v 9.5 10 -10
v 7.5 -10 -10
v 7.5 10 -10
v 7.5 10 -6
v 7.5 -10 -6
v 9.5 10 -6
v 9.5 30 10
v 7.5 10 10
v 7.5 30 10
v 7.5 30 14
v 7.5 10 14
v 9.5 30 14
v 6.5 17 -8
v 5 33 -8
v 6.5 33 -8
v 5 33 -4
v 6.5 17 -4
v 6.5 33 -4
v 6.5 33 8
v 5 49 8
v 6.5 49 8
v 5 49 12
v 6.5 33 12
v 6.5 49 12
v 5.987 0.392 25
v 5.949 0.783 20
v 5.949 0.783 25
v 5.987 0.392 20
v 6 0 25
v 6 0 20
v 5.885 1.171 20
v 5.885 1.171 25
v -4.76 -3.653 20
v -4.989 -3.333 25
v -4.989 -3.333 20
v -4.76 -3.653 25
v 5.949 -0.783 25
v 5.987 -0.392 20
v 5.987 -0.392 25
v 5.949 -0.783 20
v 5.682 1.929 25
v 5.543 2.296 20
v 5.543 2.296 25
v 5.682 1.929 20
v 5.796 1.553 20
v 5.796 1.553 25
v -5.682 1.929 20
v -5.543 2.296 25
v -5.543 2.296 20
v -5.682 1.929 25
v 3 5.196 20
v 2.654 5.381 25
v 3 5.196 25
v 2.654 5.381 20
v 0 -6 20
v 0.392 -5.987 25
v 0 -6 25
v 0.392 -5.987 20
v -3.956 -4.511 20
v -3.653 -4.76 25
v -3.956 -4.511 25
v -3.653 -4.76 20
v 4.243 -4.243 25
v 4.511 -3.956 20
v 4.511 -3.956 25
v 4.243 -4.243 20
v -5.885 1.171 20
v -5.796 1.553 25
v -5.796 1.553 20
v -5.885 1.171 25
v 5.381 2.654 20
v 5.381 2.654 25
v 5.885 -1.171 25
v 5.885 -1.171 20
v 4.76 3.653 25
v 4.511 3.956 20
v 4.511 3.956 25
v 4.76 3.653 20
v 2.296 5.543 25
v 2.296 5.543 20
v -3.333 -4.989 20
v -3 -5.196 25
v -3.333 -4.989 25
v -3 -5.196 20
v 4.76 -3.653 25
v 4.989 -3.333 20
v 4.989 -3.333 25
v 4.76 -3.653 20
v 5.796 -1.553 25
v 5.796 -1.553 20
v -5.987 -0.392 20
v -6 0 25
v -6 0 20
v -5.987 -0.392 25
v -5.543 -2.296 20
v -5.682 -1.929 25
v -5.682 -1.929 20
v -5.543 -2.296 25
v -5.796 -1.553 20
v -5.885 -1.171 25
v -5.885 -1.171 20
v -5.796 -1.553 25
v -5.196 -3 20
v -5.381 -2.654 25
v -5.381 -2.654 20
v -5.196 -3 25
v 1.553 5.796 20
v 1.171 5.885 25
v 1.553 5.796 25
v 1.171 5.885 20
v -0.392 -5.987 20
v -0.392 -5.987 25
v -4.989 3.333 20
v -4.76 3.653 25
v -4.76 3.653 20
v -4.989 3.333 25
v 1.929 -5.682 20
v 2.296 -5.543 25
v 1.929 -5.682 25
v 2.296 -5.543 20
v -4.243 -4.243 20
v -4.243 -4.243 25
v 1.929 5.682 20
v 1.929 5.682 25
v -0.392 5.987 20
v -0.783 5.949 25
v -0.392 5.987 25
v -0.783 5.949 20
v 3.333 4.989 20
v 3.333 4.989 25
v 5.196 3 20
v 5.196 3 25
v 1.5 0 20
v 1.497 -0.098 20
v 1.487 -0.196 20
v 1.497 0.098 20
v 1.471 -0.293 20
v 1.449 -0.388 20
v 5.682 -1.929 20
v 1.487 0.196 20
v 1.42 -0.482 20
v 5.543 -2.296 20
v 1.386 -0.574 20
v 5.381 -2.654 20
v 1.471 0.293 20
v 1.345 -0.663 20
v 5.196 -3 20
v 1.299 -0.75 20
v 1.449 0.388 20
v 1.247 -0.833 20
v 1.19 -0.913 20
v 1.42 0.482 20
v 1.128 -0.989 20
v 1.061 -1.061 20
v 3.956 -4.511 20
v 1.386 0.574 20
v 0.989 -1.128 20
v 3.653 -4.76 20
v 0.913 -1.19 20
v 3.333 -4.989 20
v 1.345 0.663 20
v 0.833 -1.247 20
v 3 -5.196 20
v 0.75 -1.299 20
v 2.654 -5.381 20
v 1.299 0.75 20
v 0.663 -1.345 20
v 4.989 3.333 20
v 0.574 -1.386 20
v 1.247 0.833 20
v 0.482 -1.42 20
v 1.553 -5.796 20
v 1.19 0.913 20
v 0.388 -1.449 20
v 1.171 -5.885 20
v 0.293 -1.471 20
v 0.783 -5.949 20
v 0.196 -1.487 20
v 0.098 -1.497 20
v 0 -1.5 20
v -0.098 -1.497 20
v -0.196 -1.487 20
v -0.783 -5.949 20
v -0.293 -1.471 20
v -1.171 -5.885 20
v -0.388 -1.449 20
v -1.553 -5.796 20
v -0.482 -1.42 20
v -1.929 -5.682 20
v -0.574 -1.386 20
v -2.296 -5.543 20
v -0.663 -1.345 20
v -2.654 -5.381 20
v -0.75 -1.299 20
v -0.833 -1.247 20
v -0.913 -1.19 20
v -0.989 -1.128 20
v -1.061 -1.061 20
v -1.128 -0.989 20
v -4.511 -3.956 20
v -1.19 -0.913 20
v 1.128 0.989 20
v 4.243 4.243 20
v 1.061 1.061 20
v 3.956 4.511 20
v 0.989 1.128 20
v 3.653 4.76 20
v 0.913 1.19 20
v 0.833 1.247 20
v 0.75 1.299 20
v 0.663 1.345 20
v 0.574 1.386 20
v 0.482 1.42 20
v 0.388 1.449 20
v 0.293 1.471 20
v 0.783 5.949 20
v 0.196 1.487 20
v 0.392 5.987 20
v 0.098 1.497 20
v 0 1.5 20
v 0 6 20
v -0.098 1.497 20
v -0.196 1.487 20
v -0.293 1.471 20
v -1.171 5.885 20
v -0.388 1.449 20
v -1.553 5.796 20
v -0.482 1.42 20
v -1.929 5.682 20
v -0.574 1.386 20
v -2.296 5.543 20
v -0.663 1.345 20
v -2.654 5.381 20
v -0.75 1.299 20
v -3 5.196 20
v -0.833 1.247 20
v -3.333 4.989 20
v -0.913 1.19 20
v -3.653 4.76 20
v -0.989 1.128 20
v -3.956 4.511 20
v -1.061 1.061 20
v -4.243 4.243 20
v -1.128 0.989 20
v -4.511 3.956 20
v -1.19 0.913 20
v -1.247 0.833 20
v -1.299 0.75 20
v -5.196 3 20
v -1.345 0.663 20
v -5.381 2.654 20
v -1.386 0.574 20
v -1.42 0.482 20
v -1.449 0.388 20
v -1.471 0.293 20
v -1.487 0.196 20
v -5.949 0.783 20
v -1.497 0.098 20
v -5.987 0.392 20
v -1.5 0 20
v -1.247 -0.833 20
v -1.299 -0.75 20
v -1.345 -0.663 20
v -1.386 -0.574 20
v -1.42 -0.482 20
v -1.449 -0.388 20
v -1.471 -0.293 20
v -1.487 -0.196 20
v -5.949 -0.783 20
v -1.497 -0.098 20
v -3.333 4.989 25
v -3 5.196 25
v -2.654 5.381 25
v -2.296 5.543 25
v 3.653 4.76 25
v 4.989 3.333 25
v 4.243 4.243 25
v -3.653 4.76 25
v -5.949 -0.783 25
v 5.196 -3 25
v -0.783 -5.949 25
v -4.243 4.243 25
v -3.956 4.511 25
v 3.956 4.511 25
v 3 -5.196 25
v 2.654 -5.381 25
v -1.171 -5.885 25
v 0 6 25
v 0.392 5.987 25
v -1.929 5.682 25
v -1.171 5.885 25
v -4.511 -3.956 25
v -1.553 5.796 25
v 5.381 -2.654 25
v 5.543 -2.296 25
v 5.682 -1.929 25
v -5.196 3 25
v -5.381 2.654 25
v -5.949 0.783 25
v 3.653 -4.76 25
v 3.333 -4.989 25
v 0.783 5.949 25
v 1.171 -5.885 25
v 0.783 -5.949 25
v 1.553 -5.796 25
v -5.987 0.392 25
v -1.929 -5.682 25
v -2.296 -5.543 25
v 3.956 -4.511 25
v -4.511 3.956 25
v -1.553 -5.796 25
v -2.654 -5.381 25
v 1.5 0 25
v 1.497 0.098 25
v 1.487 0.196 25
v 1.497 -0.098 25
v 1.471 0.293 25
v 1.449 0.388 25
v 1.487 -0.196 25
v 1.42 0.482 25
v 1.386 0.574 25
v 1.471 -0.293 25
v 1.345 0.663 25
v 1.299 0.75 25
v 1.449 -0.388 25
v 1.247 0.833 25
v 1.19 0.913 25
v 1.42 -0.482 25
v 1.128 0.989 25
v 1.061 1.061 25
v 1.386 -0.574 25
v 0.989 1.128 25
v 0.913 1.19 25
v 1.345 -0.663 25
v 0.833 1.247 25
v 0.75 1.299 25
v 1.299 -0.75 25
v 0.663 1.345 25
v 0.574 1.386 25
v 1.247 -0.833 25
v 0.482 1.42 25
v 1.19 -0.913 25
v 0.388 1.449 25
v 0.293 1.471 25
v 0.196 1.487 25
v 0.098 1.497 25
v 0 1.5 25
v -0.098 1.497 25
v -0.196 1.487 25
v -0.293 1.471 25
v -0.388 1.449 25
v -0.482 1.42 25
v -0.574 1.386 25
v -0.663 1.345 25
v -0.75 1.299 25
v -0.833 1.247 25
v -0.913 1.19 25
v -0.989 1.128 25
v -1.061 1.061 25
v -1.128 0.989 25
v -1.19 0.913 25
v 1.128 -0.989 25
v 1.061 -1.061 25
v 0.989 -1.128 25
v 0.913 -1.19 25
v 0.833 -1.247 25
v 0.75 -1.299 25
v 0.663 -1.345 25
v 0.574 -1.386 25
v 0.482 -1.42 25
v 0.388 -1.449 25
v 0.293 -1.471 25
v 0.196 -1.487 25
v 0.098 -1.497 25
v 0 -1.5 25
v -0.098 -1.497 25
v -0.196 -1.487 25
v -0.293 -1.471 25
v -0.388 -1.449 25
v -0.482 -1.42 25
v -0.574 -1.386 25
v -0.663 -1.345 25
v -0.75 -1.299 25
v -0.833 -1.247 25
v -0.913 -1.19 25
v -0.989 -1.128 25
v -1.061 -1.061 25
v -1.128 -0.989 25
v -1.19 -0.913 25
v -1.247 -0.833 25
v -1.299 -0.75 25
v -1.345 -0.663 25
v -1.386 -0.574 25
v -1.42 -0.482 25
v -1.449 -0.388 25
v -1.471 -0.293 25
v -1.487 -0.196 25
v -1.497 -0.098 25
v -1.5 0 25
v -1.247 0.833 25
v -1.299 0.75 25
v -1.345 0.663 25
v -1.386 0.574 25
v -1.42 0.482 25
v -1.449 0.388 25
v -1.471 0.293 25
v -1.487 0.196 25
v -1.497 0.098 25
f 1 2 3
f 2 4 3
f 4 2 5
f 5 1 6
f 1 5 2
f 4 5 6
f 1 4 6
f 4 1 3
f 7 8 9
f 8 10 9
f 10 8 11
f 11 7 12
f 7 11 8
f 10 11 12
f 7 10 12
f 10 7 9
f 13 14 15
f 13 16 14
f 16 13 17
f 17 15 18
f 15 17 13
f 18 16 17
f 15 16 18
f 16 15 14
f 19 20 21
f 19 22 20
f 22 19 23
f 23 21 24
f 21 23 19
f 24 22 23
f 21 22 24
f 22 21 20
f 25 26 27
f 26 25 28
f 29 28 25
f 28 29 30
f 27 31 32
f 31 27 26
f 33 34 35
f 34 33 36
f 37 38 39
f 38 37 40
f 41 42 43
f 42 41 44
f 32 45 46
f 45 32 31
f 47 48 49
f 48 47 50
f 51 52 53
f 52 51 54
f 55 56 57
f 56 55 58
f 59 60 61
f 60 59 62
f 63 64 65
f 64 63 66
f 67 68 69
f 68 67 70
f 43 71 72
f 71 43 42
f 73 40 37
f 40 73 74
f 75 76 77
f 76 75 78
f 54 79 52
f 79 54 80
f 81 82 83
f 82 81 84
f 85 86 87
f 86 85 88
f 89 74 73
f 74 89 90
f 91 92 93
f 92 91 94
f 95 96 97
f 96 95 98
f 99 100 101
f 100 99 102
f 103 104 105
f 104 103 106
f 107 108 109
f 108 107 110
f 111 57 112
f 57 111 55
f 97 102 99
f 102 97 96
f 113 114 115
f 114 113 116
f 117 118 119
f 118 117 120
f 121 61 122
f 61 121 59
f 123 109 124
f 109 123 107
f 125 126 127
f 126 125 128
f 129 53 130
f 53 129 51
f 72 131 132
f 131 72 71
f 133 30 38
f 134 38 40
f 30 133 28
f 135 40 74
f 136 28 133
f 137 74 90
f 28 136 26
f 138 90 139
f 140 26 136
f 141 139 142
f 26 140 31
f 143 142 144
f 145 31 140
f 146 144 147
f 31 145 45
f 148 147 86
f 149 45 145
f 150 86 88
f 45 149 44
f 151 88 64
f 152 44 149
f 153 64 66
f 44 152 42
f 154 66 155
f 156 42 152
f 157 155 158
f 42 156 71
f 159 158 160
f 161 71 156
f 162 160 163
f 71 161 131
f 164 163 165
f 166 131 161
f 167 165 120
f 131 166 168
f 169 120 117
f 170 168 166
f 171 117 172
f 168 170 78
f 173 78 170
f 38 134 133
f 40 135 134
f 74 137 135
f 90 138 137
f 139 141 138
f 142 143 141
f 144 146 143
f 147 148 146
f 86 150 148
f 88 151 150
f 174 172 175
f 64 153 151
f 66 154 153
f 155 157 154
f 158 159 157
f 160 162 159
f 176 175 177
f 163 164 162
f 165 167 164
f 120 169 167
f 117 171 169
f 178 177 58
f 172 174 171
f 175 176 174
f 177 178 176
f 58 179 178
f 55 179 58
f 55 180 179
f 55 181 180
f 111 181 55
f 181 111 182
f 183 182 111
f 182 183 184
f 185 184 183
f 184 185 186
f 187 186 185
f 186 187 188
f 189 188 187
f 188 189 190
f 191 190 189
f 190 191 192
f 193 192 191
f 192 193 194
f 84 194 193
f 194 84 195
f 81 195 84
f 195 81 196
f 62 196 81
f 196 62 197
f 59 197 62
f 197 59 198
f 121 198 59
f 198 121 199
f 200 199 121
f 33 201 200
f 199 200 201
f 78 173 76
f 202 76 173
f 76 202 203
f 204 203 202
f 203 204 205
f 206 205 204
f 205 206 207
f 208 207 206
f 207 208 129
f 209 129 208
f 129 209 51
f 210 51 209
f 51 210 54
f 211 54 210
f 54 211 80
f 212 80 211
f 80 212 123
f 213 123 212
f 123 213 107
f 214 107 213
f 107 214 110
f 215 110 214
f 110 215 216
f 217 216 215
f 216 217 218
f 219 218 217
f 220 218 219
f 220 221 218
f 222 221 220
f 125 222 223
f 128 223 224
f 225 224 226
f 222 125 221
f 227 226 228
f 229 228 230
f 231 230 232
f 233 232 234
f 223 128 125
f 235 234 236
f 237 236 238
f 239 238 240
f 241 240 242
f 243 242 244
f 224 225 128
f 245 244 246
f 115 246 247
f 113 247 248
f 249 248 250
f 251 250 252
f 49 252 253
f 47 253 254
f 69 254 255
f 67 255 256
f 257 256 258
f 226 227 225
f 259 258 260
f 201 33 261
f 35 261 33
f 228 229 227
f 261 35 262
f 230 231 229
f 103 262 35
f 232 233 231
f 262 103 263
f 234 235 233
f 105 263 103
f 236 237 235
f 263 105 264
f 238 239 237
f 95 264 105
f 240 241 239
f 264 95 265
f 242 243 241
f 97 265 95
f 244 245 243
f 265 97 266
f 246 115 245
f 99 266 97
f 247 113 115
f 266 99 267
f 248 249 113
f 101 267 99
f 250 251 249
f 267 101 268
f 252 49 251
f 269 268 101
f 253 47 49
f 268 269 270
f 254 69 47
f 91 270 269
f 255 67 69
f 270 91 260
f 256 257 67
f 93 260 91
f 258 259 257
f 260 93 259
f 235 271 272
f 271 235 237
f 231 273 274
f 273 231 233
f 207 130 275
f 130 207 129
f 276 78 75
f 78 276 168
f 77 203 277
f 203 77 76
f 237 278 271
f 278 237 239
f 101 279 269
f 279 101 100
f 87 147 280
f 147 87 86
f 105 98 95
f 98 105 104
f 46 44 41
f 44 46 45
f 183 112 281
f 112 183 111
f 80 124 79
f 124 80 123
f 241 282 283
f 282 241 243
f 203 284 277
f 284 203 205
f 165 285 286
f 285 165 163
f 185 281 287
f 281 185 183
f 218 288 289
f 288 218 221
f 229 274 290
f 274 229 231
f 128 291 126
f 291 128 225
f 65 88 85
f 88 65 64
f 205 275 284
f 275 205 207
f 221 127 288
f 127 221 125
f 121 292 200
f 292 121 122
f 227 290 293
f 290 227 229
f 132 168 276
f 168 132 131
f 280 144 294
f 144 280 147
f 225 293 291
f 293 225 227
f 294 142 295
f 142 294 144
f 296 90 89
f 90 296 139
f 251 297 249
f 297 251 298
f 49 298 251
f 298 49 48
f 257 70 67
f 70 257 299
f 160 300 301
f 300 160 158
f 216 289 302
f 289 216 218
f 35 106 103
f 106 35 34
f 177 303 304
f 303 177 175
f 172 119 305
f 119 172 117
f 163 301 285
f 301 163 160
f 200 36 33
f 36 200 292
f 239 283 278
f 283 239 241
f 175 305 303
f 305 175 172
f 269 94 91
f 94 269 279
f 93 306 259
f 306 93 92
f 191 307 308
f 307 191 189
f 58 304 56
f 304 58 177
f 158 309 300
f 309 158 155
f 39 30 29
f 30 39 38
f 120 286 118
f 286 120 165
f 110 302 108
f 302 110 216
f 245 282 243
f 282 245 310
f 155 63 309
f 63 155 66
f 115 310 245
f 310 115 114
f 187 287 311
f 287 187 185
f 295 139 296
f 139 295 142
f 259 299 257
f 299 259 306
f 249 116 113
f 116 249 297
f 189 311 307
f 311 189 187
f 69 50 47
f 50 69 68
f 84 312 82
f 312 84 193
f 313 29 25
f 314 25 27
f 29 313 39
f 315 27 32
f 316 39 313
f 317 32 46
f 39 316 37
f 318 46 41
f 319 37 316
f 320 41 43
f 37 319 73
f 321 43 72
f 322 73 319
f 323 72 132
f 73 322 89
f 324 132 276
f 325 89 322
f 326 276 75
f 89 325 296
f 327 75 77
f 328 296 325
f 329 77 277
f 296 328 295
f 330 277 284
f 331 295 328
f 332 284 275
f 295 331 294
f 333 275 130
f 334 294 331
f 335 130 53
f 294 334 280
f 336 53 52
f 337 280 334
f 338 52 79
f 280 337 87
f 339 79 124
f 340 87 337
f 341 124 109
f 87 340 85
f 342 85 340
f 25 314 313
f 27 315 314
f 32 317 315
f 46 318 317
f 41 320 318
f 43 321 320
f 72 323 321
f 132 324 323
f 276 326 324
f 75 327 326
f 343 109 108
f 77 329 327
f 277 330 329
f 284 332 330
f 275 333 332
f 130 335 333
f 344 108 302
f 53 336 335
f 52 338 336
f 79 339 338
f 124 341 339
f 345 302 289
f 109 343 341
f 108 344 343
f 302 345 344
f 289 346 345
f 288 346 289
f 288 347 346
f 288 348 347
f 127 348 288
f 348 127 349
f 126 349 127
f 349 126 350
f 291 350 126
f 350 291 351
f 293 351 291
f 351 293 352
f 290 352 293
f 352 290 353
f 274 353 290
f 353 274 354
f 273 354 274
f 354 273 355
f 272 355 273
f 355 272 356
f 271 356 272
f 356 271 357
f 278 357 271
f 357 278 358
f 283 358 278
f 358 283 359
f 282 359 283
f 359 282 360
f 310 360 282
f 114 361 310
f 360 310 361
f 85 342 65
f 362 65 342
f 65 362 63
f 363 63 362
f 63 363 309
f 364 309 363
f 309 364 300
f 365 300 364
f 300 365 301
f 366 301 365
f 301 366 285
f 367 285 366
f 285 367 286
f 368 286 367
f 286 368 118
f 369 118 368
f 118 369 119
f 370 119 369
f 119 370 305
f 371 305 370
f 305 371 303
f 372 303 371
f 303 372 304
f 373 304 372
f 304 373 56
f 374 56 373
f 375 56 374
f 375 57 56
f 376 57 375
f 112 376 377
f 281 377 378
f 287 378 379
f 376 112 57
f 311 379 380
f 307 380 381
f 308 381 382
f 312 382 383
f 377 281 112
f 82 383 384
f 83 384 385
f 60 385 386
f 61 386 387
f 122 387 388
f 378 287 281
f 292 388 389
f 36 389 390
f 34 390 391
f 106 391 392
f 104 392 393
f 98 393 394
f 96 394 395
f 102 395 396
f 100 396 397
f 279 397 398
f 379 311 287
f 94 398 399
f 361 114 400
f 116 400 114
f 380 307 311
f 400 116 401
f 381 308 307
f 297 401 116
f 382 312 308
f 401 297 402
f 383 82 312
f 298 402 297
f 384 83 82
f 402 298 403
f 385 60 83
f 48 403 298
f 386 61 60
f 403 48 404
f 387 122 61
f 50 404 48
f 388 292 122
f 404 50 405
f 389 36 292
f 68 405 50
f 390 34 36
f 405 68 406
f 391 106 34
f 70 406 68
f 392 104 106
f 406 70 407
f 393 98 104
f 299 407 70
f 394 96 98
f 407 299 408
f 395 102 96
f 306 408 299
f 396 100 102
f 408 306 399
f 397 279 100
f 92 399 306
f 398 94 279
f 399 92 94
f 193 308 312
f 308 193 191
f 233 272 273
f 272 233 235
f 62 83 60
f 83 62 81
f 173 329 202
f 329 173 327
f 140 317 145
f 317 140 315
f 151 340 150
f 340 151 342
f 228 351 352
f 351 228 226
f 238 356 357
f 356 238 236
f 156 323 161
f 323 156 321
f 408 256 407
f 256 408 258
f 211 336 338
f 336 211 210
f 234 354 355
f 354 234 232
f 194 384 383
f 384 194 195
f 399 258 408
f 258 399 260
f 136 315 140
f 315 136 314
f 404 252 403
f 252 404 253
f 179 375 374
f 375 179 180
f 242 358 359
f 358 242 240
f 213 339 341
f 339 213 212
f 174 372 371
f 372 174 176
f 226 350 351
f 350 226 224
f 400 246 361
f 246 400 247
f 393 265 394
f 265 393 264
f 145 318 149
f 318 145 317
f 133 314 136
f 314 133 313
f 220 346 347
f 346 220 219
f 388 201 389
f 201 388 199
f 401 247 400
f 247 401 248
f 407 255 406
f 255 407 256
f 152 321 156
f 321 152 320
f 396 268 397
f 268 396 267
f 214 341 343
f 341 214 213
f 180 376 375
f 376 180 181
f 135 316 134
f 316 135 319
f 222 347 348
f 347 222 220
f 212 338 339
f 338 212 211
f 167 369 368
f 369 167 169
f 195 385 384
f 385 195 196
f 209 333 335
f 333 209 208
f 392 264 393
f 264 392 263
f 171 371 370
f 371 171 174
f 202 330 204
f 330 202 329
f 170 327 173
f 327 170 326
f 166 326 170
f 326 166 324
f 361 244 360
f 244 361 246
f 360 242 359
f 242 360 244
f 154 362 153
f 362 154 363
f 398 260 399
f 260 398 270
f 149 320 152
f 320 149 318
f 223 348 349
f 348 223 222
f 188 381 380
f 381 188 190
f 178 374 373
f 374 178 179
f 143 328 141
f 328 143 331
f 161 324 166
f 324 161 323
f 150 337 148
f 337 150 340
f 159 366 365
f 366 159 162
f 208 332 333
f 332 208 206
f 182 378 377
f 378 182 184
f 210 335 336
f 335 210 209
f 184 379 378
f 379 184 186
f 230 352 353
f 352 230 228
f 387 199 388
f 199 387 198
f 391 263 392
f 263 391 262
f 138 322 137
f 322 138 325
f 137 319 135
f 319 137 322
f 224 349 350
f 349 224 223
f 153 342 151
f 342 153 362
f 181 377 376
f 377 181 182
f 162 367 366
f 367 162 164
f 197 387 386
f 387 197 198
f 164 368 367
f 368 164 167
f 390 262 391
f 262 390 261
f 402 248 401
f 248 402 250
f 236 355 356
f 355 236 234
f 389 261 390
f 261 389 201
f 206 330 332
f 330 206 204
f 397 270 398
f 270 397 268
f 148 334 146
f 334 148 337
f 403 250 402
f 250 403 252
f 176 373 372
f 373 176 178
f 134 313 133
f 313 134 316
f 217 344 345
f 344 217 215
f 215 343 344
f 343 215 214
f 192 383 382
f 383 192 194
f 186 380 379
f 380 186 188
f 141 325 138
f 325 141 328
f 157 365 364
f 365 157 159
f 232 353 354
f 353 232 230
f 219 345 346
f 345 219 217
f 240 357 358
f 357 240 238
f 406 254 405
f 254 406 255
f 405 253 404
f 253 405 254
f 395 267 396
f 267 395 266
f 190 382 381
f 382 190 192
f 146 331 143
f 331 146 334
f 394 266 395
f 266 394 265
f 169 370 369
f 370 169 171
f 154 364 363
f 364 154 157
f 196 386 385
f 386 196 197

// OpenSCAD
// Hose-barb reducer: 8 mm ID -> 5 mm ID
// Print orientation: standing upright along +Z

// ---- Parameters ----
eps      = 0.5;   // overlap for clean booleans
barb8_h  = 10;    // height of each 8 mm barb
barb8_d0 = 7.5;   // outer diameter of 8 mm barb at bottom
barb8_d1 = 9.5;   // outer diameter of 8 mm barb at top
collar_d = 12;    // diameter of the middle collar
barb5_h  = 8;     // height of each 5 mm barb
barb5_d0 = 6.5;   // outer diameter of 5 mm barb at bottom
barb5_d1 = 5.0;   // outer diameter of 5 mm barb at top
bore     = 3;     // through-bore diameter
z0       = 0;     // start of part
z1       = 20;    // end of 8 mm barbs / start of collar
z2       = 25;    // end of collar / start of 5 mm barbs
z3       = 41;    // end of 5 mm barbs

$fn = 96;

// ---- Model ----
difference() {
    union() {
        // 8 mm tubing barbs (z = 0 .. 20)
        for (s = [-1, 1])
            translate([0, 0, s * (z1 - z0) / 2])
                linear_extrude(height = bore + 2 * eps)
                    polygon(points = [
                        [barb8_d0, z0 + s * (z1 - z0) / 2],
                        [barb8_d1, z1 + s * (z1 - z0) / 2],
                        [barb8_d0, z1 + s * (z1 - z0) / 2]
                    ]);
        // collar (z = 20 .. 25)
        translate([0, 0, z1])
            cylinder(d = collar_d, h = z2 - z1);
        // 5 mm tubing barbs (z = 25 .. 41)
        for (s = [-1, 1])
            translate([0, 0, s * (z3 - z2) / 2])
                linear_extrude(height = bore + 2 * eps)
                    polygon(points = [
                        [barb5_d0, z2 + s * (z3 - z2) / 2],
                        [barb5_d1, z3 + s * (z3 - z2) / 2],
                        [barb5_d0, z3 + s * (z3 - z2) / 2]
                    ]);
    }
    // through-bore
    translate([0, 0, z0 - eps])
        cylinder(d = bore, h = z3 - z0 + 2 * eps);
}
